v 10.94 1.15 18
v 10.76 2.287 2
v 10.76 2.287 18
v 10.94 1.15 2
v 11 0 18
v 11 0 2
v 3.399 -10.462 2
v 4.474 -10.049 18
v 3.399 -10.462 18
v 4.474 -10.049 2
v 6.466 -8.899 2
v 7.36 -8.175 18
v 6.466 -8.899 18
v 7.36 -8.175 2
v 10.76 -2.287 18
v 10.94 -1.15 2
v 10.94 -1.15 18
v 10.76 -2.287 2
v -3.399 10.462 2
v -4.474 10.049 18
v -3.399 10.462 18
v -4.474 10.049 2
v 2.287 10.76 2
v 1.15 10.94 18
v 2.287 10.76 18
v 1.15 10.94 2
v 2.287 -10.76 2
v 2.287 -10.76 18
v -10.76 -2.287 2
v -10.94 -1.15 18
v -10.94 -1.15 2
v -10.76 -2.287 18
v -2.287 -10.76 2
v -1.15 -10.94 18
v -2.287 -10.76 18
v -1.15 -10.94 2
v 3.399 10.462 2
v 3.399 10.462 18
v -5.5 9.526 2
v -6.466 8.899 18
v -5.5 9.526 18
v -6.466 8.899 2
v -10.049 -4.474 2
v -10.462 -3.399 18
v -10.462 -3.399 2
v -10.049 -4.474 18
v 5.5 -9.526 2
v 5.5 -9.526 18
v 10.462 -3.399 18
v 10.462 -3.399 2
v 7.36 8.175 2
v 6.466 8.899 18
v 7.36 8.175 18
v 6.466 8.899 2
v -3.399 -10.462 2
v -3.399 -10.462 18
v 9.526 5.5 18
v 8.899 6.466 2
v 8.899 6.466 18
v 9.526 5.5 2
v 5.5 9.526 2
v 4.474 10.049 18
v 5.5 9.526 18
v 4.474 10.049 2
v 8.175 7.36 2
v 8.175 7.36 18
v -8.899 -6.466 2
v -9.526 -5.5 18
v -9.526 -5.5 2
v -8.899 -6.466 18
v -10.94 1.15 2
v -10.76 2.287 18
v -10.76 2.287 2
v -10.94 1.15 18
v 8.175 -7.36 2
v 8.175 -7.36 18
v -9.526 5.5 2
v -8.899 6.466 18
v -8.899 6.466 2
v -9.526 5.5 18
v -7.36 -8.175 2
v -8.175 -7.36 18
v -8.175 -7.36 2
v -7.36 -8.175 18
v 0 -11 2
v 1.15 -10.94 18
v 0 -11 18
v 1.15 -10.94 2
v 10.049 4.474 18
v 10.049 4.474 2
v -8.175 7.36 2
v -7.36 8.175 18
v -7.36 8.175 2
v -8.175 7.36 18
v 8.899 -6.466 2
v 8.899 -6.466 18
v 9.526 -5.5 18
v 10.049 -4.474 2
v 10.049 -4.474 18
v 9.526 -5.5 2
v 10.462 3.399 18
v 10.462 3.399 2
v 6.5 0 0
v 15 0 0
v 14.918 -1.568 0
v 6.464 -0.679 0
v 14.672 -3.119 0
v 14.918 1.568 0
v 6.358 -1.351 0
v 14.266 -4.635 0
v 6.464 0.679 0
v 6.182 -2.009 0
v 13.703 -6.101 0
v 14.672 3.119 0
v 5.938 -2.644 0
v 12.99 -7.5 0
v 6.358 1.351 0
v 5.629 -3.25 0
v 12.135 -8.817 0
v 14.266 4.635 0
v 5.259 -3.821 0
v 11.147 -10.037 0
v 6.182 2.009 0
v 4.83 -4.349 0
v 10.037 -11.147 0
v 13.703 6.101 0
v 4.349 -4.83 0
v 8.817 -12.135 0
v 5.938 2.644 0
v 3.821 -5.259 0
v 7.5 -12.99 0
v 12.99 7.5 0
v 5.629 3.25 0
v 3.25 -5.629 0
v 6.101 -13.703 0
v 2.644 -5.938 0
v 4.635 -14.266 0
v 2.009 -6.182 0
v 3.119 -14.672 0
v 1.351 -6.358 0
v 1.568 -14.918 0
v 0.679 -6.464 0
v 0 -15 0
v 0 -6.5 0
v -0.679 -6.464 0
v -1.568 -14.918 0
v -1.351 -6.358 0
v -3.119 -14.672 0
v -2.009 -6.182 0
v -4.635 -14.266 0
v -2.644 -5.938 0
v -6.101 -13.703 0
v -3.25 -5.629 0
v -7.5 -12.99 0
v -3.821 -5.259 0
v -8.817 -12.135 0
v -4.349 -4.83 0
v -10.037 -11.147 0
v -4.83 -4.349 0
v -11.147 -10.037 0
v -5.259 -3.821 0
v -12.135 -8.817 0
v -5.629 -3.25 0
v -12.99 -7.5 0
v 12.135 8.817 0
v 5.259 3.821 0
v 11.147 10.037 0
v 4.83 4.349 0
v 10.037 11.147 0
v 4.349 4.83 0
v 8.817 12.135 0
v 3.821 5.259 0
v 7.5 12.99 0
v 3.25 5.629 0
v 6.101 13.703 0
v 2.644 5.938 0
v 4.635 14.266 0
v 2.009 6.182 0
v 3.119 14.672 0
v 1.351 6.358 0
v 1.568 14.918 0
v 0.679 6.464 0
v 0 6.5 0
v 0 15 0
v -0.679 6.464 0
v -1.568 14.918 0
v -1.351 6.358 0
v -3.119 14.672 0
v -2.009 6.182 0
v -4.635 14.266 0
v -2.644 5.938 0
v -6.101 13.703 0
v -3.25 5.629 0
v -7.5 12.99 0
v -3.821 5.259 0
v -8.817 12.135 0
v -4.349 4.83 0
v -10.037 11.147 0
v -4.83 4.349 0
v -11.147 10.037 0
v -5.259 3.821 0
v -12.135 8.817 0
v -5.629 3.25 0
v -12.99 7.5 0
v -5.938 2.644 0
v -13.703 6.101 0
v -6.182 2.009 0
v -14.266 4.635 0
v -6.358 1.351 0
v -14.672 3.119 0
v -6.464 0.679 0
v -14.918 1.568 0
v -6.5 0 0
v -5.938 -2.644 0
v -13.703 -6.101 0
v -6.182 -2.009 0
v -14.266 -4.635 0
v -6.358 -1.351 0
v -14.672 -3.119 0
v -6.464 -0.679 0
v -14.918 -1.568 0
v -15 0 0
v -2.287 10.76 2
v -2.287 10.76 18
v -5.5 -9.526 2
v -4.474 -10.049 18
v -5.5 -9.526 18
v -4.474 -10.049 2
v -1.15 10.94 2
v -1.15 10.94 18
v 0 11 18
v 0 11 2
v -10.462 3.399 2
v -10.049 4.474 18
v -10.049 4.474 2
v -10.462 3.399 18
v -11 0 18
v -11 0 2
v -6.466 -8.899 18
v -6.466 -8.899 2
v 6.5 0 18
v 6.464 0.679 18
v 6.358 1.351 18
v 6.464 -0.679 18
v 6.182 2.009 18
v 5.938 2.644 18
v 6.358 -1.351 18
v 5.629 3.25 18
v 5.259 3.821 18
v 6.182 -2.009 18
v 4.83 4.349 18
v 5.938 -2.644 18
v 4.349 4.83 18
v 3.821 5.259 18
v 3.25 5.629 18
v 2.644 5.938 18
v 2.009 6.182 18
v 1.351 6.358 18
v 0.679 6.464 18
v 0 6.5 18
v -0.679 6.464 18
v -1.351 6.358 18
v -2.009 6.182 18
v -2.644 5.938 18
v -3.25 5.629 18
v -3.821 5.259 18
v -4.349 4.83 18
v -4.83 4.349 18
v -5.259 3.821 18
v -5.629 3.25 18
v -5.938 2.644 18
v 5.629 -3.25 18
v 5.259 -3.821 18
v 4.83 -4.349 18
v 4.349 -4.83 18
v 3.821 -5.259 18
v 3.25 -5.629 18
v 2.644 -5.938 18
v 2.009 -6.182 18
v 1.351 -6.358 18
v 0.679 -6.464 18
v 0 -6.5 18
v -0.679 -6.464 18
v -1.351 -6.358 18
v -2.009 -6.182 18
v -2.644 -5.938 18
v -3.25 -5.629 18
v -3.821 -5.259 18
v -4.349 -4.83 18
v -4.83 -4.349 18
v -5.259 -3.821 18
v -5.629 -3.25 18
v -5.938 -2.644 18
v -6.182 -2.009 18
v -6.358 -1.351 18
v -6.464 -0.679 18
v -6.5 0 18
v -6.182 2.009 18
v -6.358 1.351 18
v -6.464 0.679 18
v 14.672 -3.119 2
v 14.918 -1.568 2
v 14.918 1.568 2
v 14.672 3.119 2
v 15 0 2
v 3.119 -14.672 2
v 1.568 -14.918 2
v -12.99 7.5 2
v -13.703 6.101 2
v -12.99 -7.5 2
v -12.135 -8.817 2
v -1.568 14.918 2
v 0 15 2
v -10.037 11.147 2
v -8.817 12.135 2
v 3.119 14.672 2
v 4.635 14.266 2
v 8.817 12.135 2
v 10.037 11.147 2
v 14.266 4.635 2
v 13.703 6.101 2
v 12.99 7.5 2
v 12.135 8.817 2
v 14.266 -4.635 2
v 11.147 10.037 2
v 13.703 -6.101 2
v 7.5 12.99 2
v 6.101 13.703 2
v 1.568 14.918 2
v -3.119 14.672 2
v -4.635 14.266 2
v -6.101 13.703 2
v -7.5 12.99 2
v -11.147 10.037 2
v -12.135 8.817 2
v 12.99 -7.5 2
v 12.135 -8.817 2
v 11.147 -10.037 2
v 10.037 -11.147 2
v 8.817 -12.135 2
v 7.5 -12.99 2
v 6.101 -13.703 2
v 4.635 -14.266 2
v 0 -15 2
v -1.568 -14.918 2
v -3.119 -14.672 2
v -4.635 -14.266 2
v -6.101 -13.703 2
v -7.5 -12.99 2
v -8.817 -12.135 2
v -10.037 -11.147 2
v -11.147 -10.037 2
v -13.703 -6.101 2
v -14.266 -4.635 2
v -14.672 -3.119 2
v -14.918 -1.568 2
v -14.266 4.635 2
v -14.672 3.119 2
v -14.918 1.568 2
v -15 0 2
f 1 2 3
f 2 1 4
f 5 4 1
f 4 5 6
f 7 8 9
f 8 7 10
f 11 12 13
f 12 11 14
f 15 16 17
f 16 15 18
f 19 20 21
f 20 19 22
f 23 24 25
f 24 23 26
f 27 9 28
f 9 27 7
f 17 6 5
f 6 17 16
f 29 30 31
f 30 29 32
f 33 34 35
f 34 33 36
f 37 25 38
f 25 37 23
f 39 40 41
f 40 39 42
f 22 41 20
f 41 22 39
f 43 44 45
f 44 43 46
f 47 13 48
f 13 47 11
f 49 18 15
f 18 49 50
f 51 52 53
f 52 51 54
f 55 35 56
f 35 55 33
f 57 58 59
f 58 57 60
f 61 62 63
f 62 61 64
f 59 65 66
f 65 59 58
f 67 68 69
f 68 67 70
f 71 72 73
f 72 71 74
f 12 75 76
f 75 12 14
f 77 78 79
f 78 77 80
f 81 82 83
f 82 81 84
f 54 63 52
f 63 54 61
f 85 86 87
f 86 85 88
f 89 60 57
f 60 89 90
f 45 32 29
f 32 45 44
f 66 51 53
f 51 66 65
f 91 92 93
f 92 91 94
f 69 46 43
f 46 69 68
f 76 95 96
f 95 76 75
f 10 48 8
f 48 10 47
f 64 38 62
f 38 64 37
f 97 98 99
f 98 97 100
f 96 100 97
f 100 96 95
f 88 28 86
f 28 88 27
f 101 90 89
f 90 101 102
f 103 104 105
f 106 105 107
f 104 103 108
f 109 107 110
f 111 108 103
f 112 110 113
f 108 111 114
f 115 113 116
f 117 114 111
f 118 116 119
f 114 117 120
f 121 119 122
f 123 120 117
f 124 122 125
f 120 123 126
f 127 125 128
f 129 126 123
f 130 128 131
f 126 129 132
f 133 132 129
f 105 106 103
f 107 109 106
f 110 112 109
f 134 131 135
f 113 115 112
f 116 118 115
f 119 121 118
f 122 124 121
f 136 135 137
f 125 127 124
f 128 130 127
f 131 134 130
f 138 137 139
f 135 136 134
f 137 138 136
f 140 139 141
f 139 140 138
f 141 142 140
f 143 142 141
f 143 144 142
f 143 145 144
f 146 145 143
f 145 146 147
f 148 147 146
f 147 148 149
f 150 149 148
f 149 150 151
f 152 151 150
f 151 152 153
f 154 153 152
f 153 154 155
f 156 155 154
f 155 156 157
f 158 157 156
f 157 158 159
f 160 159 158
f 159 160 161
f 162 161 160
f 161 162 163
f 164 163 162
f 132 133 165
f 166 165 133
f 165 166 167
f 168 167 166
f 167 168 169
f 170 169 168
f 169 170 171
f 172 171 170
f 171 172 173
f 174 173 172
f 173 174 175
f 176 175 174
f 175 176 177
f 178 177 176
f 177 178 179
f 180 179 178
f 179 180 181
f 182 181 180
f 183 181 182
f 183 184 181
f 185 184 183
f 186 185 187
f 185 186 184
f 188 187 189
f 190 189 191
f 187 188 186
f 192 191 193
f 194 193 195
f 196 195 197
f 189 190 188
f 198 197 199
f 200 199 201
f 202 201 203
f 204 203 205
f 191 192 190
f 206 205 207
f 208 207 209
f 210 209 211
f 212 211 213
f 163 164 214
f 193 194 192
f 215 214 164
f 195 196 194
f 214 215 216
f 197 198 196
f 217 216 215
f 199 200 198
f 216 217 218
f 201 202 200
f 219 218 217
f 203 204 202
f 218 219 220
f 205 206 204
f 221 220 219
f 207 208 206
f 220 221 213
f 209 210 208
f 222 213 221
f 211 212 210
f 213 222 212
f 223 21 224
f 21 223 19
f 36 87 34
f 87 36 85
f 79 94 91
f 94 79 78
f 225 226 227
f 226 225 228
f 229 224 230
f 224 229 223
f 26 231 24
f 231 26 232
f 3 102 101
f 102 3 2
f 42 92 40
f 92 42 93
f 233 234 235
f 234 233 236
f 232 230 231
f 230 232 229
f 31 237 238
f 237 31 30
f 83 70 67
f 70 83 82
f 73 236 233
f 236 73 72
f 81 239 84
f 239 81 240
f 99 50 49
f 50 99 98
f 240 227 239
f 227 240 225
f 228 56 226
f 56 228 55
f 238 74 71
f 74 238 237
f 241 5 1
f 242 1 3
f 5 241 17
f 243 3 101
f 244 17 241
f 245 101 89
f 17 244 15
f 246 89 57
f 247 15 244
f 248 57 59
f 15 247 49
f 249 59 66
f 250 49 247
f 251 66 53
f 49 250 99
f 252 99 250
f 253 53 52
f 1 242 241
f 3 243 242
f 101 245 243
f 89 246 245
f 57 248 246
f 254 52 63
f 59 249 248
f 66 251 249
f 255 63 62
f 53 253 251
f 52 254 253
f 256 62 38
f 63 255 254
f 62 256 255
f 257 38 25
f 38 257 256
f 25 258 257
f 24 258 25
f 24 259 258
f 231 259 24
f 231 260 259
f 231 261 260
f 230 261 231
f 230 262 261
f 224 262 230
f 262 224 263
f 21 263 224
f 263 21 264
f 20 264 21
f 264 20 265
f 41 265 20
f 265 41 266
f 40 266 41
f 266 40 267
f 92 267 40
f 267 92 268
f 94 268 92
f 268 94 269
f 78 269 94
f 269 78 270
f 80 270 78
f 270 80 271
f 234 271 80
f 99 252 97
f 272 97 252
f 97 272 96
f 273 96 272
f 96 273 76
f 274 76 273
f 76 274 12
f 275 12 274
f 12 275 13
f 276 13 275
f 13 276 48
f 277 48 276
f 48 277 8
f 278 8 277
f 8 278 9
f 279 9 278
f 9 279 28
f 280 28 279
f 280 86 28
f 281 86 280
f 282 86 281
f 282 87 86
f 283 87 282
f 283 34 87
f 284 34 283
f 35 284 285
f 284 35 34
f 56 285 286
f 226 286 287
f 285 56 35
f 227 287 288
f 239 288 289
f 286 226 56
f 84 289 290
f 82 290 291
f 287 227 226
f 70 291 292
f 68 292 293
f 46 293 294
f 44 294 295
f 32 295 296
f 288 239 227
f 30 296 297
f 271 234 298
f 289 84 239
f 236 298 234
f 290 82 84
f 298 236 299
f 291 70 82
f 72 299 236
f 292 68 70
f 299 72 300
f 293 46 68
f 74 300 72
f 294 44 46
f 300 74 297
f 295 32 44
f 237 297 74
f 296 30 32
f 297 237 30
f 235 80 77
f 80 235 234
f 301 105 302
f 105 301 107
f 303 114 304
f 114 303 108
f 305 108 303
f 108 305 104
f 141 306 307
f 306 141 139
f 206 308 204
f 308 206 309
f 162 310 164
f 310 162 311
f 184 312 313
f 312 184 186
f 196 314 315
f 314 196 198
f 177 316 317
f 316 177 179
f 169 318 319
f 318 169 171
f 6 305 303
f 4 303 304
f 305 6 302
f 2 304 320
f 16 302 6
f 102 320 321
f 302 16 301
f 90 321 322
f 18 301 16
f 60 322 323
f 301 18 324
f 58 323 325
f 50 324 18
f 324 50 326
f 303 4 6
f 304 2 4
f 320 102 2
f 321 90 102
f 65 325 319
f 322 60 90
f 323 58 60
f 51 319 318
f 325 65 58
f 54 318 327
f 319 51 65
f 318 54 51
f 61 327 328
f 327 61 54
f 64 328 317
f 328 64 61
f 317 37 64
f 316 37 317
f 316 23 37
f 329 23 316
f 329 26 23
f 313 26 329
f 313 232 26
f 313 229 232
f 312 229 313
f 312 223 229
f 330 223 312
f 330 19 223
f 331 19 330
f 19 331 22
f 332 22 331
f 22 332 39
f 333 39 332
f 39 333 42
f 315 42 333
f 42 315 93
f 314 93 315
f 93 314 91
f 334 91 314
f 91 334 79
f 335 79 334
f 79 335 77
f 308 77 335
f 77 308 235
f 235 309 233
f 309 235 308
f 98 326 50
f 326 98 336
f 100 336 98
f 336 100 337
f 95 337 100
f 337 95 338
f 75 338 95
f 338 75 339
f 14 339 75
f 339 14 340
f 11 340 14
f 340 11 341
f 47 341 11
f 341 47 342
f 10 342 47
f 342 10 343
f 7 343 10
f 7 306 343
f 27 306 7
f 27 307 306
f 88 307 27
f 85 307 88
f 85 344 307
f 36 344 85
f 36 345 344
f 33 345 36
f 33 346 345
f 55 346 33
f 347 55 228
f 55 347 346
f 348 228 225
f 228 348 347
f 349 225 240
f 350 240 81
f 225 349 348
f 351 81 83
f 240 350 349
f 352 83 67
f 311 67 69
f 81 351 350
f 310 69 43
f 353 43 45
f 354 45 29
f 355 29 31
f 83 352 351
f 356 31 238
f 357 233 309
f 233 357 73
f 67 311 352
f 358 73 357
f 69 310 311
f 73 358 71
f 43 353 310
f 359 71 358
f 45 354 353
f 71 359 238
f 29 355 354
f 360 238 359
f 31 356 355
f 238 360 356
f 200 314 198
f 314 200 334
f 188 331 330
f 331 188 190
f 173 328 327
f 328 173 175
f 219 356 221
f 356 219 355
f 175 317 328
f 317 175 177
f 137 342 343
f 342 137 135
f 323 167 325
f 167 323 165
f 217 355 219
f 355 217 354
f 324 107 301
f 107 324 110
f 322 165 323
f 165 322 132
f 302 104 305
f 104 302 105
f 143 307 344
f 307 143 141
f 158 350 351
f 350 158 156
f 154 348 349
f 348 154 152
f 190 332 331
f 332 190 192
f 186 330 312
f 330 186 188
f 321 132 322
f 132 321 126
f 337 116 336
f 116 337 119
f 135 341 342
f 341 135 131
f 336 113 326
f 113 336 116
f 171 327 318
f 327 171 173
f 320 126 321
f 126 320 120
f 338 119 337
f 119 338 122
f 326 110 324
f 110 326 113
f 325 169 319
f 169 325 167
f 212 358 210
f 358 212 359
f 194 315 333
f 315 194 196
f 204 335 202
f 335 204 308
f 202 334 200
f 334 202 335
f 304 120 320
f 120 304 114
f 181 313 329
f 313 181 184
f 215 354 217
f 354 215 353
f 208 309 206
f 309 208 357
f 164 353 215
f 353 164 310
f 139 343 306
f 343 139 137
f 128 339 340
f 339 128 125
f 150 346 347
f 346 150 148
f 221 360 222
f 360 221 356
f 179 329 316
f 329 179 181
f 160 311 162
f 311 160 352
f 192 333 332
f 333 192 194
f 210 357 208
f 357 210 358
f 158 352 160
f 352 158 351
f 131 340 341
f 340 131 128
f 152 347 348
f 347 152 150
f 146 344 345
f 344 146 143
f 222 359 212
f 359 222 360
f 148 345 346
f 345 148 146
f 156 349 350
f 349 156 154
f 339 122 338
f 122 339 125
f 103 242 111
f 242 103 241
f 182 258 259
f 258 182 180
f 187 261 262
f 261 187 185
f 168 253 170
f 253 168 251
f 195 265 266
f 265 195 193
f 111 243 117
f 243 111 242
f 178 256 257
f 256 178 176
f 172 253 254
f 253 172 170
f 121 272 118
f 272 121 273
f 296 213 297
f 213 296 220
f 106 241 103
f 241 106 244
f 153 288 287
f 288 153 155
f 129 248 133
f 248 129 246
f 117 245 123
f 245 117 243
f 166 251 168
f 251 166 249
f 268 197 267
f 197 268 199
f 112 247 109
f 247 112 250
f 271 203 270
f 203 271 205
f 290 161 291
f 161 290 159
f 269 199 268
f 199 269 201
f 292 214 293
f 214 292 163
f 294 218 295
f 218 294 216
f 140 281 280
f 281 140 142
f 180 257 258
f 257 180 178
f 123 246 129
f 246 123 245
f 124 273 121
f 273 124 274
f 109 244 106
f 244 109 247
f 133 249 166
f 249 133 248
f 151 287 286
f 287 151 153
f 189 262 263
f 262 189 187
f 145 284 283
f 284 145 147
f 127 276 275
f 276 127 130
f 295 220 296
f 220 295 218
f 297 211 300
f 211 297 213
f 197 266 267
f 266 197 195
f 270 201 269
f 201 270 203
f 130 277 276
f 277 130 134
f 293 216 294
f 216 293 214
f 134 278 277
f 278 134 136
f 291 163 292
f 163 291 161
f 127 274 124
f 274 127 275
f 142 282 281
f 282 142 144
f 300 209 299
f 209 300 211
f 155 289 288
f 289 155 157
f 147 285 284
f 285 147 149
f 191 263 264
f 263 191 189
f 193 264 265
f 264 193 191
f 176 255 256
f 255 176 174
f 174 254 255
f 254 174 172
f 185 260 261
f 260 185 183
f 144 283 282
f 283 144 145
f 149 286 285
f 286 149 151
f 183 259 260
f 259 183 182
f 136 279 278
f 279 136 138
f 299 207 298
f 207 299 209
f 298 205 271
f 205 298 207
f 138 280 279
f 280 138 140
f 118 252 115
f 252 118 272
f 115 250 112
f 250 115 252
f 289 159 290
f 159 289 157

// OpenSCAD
// Rivet nut / nutsert.
$fn = 60;
eps = 0.02;
thread_d = 13;
outer_d = 22;
length = 18;
flange_d = 30;
difference() { union() { cylinder(d=max(outer_d, thread_d+3),h=length); cylinder(d=max(flange_d, thread_d+6),h=2); } translate([0,0,-eps]) cylinder(d=thread_d,h=length+2*eps); }
